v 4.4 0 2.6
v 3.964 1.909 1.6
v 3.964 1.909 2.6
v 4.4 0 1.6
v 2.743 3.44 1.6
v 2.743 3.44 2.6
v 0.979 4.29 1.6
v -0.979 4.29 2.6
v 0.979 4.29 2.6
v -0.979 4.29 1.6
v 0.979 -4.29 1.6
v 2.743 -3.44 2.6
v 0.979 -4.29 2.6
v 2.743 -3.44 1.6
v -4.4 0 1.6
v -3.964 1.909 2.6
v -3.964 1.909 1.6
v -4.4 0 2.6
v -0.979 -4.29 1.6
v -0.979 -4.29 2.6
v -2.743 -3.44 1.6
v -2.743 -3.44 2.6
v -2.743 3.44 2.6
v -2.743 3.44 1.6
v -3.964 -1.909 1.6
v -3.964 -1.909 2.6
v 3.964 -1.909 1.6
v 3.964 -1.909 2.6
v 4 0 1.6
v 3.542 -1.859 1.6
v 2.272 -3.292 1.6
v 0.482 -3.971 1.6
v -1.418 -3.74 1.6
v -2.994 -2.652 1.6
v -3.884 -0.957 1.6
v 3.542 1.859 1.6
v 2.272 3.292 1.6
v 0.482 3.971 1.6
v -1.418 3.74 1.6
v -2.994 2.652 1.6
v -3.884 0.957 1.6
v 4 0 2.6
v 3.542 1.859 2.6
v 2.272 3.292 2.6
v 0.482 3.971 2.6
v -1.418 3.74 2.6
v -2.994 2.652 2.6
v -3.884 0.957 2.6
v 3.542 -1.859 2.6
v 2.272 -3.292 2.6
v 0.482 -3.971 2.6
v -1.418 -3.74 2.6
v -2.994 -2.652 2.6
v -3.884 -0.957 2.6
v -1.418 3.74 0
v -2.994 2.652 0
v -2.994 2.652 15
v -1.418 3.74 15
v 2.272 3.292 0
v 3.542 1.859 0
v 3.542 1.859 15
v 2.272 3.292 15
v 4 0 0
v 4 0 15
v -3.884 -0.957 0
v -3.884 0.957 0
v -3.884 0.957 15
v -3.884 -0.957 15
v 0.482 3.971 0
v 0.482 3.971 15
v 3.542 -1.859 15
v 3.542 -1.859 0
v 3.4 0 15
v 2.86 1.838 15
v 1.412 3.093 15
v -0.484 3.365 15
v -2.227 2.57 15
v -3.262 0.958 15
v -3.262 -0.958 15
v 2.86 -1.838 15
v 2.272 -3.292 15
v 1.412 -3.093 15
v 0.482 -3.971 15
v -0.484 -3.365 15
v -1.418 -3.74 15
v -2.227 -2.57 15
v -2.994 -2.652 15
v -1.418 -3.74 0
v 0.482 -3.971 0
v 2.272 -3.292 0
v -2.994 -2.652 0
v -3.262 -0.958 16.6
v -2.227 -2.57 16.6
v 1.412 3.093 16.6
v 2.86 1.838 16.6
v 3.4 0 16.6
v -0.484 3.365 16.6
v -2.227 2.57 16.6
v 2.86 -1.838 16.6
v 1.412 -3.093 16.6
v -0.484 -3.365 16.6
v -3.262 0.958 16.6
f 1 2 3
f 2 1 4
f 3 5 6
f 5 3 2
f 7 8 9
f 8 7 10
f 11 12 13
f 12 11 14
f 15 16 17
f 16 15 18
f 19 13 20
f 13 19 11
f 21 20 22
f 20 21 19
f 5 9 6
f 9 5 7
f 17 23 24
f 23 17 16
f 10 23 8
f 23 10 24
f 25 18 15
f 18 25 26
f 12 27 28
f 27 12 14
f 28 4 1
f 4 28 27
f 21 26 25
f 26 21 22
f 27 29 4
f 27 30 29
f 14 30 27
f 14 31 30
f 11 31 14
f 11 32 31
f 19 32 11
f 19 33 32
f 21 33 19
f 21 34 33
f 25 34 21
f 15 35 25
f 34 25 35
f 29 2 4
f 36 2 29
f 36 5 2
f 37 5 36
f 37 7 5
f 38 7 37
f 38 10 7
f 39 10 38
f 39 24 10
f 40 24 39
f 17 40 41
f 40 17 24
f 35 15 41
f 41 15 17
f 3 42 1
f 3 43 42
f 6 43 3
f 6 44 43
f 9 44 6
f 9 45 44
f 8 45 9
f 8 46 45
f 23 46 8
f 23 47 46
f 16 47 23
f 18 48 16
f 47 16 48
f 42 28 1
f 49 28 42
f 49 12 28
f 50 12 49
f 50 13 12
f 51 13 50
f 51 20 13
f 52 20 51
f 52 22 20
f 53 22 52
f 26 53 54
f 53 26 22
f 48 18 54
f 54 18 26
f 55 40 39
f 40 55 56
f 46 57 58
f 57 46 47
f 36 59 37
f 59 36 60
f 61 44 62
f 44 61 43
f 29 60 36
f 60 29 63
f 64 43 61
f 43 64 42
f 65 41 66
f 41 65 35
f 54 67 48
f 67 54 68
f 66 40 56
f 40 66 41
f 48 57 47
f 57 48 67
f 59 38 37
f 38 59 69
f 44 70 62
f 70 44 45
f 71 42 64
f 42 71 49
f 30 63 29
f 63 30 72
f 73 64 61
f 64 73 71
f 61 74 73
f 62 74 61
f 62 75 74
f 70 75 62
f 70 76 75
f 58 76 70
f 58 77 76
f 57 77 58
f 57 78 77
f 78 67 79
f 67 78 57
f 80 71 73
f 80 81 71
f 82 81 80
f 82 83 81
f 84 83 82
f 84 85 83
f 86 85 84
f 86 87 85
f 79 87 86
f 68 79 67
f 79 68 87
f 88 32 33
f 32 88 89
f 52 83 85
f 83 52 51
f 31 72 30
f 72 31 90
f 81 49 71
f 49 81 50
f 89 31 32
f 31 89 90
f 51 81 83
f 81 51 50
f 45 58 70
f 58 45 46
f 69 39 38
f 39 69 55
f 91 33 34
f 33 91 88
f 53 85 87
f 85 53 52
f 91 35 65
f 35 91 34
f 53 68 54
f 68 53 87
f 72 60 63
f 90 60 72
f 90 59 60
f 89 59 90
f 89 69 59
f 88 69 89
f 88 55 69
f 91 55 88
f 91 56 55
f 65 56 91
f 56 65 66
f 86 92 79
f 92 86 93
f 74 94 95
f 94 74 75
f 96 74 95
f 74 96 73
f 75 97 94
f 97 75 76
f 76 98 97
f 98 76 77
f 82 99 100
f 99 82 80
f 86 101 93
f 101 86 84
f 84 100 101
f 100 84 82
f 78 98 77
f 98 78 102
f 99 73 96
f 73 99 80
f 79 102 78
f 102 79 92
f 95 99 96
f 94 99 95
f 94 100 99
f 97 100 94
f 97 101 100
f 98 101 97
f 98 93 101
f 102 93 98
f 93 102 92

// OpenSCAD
// part_id: a3
// name: A3 pin
// source_drawing_ids: DRW-001
// units: mm
// revision: 0.1-placeholder
// SPDX-License-Identifier: MIT

module part_a3(d = 8, h = 15) {
    union() {
        cylinder(d = d, h = h, center = false);
        translate([0, 0, h]) cylinder(d = d * 0.85, h = 1.6, center = false);
        translate([0, 0, 1.6]) difference() {
            cylinder(d = d + 0.8, h = 1.0, center = false);
            cylinder(d = d - 1.0, h = 1.2, center = false);
        }
    }
}


// ---- "main guard" ----
// Default to previewing when opened directly:
if (is_undef(__LIB_MODE__)) {
    part_a3();
}
